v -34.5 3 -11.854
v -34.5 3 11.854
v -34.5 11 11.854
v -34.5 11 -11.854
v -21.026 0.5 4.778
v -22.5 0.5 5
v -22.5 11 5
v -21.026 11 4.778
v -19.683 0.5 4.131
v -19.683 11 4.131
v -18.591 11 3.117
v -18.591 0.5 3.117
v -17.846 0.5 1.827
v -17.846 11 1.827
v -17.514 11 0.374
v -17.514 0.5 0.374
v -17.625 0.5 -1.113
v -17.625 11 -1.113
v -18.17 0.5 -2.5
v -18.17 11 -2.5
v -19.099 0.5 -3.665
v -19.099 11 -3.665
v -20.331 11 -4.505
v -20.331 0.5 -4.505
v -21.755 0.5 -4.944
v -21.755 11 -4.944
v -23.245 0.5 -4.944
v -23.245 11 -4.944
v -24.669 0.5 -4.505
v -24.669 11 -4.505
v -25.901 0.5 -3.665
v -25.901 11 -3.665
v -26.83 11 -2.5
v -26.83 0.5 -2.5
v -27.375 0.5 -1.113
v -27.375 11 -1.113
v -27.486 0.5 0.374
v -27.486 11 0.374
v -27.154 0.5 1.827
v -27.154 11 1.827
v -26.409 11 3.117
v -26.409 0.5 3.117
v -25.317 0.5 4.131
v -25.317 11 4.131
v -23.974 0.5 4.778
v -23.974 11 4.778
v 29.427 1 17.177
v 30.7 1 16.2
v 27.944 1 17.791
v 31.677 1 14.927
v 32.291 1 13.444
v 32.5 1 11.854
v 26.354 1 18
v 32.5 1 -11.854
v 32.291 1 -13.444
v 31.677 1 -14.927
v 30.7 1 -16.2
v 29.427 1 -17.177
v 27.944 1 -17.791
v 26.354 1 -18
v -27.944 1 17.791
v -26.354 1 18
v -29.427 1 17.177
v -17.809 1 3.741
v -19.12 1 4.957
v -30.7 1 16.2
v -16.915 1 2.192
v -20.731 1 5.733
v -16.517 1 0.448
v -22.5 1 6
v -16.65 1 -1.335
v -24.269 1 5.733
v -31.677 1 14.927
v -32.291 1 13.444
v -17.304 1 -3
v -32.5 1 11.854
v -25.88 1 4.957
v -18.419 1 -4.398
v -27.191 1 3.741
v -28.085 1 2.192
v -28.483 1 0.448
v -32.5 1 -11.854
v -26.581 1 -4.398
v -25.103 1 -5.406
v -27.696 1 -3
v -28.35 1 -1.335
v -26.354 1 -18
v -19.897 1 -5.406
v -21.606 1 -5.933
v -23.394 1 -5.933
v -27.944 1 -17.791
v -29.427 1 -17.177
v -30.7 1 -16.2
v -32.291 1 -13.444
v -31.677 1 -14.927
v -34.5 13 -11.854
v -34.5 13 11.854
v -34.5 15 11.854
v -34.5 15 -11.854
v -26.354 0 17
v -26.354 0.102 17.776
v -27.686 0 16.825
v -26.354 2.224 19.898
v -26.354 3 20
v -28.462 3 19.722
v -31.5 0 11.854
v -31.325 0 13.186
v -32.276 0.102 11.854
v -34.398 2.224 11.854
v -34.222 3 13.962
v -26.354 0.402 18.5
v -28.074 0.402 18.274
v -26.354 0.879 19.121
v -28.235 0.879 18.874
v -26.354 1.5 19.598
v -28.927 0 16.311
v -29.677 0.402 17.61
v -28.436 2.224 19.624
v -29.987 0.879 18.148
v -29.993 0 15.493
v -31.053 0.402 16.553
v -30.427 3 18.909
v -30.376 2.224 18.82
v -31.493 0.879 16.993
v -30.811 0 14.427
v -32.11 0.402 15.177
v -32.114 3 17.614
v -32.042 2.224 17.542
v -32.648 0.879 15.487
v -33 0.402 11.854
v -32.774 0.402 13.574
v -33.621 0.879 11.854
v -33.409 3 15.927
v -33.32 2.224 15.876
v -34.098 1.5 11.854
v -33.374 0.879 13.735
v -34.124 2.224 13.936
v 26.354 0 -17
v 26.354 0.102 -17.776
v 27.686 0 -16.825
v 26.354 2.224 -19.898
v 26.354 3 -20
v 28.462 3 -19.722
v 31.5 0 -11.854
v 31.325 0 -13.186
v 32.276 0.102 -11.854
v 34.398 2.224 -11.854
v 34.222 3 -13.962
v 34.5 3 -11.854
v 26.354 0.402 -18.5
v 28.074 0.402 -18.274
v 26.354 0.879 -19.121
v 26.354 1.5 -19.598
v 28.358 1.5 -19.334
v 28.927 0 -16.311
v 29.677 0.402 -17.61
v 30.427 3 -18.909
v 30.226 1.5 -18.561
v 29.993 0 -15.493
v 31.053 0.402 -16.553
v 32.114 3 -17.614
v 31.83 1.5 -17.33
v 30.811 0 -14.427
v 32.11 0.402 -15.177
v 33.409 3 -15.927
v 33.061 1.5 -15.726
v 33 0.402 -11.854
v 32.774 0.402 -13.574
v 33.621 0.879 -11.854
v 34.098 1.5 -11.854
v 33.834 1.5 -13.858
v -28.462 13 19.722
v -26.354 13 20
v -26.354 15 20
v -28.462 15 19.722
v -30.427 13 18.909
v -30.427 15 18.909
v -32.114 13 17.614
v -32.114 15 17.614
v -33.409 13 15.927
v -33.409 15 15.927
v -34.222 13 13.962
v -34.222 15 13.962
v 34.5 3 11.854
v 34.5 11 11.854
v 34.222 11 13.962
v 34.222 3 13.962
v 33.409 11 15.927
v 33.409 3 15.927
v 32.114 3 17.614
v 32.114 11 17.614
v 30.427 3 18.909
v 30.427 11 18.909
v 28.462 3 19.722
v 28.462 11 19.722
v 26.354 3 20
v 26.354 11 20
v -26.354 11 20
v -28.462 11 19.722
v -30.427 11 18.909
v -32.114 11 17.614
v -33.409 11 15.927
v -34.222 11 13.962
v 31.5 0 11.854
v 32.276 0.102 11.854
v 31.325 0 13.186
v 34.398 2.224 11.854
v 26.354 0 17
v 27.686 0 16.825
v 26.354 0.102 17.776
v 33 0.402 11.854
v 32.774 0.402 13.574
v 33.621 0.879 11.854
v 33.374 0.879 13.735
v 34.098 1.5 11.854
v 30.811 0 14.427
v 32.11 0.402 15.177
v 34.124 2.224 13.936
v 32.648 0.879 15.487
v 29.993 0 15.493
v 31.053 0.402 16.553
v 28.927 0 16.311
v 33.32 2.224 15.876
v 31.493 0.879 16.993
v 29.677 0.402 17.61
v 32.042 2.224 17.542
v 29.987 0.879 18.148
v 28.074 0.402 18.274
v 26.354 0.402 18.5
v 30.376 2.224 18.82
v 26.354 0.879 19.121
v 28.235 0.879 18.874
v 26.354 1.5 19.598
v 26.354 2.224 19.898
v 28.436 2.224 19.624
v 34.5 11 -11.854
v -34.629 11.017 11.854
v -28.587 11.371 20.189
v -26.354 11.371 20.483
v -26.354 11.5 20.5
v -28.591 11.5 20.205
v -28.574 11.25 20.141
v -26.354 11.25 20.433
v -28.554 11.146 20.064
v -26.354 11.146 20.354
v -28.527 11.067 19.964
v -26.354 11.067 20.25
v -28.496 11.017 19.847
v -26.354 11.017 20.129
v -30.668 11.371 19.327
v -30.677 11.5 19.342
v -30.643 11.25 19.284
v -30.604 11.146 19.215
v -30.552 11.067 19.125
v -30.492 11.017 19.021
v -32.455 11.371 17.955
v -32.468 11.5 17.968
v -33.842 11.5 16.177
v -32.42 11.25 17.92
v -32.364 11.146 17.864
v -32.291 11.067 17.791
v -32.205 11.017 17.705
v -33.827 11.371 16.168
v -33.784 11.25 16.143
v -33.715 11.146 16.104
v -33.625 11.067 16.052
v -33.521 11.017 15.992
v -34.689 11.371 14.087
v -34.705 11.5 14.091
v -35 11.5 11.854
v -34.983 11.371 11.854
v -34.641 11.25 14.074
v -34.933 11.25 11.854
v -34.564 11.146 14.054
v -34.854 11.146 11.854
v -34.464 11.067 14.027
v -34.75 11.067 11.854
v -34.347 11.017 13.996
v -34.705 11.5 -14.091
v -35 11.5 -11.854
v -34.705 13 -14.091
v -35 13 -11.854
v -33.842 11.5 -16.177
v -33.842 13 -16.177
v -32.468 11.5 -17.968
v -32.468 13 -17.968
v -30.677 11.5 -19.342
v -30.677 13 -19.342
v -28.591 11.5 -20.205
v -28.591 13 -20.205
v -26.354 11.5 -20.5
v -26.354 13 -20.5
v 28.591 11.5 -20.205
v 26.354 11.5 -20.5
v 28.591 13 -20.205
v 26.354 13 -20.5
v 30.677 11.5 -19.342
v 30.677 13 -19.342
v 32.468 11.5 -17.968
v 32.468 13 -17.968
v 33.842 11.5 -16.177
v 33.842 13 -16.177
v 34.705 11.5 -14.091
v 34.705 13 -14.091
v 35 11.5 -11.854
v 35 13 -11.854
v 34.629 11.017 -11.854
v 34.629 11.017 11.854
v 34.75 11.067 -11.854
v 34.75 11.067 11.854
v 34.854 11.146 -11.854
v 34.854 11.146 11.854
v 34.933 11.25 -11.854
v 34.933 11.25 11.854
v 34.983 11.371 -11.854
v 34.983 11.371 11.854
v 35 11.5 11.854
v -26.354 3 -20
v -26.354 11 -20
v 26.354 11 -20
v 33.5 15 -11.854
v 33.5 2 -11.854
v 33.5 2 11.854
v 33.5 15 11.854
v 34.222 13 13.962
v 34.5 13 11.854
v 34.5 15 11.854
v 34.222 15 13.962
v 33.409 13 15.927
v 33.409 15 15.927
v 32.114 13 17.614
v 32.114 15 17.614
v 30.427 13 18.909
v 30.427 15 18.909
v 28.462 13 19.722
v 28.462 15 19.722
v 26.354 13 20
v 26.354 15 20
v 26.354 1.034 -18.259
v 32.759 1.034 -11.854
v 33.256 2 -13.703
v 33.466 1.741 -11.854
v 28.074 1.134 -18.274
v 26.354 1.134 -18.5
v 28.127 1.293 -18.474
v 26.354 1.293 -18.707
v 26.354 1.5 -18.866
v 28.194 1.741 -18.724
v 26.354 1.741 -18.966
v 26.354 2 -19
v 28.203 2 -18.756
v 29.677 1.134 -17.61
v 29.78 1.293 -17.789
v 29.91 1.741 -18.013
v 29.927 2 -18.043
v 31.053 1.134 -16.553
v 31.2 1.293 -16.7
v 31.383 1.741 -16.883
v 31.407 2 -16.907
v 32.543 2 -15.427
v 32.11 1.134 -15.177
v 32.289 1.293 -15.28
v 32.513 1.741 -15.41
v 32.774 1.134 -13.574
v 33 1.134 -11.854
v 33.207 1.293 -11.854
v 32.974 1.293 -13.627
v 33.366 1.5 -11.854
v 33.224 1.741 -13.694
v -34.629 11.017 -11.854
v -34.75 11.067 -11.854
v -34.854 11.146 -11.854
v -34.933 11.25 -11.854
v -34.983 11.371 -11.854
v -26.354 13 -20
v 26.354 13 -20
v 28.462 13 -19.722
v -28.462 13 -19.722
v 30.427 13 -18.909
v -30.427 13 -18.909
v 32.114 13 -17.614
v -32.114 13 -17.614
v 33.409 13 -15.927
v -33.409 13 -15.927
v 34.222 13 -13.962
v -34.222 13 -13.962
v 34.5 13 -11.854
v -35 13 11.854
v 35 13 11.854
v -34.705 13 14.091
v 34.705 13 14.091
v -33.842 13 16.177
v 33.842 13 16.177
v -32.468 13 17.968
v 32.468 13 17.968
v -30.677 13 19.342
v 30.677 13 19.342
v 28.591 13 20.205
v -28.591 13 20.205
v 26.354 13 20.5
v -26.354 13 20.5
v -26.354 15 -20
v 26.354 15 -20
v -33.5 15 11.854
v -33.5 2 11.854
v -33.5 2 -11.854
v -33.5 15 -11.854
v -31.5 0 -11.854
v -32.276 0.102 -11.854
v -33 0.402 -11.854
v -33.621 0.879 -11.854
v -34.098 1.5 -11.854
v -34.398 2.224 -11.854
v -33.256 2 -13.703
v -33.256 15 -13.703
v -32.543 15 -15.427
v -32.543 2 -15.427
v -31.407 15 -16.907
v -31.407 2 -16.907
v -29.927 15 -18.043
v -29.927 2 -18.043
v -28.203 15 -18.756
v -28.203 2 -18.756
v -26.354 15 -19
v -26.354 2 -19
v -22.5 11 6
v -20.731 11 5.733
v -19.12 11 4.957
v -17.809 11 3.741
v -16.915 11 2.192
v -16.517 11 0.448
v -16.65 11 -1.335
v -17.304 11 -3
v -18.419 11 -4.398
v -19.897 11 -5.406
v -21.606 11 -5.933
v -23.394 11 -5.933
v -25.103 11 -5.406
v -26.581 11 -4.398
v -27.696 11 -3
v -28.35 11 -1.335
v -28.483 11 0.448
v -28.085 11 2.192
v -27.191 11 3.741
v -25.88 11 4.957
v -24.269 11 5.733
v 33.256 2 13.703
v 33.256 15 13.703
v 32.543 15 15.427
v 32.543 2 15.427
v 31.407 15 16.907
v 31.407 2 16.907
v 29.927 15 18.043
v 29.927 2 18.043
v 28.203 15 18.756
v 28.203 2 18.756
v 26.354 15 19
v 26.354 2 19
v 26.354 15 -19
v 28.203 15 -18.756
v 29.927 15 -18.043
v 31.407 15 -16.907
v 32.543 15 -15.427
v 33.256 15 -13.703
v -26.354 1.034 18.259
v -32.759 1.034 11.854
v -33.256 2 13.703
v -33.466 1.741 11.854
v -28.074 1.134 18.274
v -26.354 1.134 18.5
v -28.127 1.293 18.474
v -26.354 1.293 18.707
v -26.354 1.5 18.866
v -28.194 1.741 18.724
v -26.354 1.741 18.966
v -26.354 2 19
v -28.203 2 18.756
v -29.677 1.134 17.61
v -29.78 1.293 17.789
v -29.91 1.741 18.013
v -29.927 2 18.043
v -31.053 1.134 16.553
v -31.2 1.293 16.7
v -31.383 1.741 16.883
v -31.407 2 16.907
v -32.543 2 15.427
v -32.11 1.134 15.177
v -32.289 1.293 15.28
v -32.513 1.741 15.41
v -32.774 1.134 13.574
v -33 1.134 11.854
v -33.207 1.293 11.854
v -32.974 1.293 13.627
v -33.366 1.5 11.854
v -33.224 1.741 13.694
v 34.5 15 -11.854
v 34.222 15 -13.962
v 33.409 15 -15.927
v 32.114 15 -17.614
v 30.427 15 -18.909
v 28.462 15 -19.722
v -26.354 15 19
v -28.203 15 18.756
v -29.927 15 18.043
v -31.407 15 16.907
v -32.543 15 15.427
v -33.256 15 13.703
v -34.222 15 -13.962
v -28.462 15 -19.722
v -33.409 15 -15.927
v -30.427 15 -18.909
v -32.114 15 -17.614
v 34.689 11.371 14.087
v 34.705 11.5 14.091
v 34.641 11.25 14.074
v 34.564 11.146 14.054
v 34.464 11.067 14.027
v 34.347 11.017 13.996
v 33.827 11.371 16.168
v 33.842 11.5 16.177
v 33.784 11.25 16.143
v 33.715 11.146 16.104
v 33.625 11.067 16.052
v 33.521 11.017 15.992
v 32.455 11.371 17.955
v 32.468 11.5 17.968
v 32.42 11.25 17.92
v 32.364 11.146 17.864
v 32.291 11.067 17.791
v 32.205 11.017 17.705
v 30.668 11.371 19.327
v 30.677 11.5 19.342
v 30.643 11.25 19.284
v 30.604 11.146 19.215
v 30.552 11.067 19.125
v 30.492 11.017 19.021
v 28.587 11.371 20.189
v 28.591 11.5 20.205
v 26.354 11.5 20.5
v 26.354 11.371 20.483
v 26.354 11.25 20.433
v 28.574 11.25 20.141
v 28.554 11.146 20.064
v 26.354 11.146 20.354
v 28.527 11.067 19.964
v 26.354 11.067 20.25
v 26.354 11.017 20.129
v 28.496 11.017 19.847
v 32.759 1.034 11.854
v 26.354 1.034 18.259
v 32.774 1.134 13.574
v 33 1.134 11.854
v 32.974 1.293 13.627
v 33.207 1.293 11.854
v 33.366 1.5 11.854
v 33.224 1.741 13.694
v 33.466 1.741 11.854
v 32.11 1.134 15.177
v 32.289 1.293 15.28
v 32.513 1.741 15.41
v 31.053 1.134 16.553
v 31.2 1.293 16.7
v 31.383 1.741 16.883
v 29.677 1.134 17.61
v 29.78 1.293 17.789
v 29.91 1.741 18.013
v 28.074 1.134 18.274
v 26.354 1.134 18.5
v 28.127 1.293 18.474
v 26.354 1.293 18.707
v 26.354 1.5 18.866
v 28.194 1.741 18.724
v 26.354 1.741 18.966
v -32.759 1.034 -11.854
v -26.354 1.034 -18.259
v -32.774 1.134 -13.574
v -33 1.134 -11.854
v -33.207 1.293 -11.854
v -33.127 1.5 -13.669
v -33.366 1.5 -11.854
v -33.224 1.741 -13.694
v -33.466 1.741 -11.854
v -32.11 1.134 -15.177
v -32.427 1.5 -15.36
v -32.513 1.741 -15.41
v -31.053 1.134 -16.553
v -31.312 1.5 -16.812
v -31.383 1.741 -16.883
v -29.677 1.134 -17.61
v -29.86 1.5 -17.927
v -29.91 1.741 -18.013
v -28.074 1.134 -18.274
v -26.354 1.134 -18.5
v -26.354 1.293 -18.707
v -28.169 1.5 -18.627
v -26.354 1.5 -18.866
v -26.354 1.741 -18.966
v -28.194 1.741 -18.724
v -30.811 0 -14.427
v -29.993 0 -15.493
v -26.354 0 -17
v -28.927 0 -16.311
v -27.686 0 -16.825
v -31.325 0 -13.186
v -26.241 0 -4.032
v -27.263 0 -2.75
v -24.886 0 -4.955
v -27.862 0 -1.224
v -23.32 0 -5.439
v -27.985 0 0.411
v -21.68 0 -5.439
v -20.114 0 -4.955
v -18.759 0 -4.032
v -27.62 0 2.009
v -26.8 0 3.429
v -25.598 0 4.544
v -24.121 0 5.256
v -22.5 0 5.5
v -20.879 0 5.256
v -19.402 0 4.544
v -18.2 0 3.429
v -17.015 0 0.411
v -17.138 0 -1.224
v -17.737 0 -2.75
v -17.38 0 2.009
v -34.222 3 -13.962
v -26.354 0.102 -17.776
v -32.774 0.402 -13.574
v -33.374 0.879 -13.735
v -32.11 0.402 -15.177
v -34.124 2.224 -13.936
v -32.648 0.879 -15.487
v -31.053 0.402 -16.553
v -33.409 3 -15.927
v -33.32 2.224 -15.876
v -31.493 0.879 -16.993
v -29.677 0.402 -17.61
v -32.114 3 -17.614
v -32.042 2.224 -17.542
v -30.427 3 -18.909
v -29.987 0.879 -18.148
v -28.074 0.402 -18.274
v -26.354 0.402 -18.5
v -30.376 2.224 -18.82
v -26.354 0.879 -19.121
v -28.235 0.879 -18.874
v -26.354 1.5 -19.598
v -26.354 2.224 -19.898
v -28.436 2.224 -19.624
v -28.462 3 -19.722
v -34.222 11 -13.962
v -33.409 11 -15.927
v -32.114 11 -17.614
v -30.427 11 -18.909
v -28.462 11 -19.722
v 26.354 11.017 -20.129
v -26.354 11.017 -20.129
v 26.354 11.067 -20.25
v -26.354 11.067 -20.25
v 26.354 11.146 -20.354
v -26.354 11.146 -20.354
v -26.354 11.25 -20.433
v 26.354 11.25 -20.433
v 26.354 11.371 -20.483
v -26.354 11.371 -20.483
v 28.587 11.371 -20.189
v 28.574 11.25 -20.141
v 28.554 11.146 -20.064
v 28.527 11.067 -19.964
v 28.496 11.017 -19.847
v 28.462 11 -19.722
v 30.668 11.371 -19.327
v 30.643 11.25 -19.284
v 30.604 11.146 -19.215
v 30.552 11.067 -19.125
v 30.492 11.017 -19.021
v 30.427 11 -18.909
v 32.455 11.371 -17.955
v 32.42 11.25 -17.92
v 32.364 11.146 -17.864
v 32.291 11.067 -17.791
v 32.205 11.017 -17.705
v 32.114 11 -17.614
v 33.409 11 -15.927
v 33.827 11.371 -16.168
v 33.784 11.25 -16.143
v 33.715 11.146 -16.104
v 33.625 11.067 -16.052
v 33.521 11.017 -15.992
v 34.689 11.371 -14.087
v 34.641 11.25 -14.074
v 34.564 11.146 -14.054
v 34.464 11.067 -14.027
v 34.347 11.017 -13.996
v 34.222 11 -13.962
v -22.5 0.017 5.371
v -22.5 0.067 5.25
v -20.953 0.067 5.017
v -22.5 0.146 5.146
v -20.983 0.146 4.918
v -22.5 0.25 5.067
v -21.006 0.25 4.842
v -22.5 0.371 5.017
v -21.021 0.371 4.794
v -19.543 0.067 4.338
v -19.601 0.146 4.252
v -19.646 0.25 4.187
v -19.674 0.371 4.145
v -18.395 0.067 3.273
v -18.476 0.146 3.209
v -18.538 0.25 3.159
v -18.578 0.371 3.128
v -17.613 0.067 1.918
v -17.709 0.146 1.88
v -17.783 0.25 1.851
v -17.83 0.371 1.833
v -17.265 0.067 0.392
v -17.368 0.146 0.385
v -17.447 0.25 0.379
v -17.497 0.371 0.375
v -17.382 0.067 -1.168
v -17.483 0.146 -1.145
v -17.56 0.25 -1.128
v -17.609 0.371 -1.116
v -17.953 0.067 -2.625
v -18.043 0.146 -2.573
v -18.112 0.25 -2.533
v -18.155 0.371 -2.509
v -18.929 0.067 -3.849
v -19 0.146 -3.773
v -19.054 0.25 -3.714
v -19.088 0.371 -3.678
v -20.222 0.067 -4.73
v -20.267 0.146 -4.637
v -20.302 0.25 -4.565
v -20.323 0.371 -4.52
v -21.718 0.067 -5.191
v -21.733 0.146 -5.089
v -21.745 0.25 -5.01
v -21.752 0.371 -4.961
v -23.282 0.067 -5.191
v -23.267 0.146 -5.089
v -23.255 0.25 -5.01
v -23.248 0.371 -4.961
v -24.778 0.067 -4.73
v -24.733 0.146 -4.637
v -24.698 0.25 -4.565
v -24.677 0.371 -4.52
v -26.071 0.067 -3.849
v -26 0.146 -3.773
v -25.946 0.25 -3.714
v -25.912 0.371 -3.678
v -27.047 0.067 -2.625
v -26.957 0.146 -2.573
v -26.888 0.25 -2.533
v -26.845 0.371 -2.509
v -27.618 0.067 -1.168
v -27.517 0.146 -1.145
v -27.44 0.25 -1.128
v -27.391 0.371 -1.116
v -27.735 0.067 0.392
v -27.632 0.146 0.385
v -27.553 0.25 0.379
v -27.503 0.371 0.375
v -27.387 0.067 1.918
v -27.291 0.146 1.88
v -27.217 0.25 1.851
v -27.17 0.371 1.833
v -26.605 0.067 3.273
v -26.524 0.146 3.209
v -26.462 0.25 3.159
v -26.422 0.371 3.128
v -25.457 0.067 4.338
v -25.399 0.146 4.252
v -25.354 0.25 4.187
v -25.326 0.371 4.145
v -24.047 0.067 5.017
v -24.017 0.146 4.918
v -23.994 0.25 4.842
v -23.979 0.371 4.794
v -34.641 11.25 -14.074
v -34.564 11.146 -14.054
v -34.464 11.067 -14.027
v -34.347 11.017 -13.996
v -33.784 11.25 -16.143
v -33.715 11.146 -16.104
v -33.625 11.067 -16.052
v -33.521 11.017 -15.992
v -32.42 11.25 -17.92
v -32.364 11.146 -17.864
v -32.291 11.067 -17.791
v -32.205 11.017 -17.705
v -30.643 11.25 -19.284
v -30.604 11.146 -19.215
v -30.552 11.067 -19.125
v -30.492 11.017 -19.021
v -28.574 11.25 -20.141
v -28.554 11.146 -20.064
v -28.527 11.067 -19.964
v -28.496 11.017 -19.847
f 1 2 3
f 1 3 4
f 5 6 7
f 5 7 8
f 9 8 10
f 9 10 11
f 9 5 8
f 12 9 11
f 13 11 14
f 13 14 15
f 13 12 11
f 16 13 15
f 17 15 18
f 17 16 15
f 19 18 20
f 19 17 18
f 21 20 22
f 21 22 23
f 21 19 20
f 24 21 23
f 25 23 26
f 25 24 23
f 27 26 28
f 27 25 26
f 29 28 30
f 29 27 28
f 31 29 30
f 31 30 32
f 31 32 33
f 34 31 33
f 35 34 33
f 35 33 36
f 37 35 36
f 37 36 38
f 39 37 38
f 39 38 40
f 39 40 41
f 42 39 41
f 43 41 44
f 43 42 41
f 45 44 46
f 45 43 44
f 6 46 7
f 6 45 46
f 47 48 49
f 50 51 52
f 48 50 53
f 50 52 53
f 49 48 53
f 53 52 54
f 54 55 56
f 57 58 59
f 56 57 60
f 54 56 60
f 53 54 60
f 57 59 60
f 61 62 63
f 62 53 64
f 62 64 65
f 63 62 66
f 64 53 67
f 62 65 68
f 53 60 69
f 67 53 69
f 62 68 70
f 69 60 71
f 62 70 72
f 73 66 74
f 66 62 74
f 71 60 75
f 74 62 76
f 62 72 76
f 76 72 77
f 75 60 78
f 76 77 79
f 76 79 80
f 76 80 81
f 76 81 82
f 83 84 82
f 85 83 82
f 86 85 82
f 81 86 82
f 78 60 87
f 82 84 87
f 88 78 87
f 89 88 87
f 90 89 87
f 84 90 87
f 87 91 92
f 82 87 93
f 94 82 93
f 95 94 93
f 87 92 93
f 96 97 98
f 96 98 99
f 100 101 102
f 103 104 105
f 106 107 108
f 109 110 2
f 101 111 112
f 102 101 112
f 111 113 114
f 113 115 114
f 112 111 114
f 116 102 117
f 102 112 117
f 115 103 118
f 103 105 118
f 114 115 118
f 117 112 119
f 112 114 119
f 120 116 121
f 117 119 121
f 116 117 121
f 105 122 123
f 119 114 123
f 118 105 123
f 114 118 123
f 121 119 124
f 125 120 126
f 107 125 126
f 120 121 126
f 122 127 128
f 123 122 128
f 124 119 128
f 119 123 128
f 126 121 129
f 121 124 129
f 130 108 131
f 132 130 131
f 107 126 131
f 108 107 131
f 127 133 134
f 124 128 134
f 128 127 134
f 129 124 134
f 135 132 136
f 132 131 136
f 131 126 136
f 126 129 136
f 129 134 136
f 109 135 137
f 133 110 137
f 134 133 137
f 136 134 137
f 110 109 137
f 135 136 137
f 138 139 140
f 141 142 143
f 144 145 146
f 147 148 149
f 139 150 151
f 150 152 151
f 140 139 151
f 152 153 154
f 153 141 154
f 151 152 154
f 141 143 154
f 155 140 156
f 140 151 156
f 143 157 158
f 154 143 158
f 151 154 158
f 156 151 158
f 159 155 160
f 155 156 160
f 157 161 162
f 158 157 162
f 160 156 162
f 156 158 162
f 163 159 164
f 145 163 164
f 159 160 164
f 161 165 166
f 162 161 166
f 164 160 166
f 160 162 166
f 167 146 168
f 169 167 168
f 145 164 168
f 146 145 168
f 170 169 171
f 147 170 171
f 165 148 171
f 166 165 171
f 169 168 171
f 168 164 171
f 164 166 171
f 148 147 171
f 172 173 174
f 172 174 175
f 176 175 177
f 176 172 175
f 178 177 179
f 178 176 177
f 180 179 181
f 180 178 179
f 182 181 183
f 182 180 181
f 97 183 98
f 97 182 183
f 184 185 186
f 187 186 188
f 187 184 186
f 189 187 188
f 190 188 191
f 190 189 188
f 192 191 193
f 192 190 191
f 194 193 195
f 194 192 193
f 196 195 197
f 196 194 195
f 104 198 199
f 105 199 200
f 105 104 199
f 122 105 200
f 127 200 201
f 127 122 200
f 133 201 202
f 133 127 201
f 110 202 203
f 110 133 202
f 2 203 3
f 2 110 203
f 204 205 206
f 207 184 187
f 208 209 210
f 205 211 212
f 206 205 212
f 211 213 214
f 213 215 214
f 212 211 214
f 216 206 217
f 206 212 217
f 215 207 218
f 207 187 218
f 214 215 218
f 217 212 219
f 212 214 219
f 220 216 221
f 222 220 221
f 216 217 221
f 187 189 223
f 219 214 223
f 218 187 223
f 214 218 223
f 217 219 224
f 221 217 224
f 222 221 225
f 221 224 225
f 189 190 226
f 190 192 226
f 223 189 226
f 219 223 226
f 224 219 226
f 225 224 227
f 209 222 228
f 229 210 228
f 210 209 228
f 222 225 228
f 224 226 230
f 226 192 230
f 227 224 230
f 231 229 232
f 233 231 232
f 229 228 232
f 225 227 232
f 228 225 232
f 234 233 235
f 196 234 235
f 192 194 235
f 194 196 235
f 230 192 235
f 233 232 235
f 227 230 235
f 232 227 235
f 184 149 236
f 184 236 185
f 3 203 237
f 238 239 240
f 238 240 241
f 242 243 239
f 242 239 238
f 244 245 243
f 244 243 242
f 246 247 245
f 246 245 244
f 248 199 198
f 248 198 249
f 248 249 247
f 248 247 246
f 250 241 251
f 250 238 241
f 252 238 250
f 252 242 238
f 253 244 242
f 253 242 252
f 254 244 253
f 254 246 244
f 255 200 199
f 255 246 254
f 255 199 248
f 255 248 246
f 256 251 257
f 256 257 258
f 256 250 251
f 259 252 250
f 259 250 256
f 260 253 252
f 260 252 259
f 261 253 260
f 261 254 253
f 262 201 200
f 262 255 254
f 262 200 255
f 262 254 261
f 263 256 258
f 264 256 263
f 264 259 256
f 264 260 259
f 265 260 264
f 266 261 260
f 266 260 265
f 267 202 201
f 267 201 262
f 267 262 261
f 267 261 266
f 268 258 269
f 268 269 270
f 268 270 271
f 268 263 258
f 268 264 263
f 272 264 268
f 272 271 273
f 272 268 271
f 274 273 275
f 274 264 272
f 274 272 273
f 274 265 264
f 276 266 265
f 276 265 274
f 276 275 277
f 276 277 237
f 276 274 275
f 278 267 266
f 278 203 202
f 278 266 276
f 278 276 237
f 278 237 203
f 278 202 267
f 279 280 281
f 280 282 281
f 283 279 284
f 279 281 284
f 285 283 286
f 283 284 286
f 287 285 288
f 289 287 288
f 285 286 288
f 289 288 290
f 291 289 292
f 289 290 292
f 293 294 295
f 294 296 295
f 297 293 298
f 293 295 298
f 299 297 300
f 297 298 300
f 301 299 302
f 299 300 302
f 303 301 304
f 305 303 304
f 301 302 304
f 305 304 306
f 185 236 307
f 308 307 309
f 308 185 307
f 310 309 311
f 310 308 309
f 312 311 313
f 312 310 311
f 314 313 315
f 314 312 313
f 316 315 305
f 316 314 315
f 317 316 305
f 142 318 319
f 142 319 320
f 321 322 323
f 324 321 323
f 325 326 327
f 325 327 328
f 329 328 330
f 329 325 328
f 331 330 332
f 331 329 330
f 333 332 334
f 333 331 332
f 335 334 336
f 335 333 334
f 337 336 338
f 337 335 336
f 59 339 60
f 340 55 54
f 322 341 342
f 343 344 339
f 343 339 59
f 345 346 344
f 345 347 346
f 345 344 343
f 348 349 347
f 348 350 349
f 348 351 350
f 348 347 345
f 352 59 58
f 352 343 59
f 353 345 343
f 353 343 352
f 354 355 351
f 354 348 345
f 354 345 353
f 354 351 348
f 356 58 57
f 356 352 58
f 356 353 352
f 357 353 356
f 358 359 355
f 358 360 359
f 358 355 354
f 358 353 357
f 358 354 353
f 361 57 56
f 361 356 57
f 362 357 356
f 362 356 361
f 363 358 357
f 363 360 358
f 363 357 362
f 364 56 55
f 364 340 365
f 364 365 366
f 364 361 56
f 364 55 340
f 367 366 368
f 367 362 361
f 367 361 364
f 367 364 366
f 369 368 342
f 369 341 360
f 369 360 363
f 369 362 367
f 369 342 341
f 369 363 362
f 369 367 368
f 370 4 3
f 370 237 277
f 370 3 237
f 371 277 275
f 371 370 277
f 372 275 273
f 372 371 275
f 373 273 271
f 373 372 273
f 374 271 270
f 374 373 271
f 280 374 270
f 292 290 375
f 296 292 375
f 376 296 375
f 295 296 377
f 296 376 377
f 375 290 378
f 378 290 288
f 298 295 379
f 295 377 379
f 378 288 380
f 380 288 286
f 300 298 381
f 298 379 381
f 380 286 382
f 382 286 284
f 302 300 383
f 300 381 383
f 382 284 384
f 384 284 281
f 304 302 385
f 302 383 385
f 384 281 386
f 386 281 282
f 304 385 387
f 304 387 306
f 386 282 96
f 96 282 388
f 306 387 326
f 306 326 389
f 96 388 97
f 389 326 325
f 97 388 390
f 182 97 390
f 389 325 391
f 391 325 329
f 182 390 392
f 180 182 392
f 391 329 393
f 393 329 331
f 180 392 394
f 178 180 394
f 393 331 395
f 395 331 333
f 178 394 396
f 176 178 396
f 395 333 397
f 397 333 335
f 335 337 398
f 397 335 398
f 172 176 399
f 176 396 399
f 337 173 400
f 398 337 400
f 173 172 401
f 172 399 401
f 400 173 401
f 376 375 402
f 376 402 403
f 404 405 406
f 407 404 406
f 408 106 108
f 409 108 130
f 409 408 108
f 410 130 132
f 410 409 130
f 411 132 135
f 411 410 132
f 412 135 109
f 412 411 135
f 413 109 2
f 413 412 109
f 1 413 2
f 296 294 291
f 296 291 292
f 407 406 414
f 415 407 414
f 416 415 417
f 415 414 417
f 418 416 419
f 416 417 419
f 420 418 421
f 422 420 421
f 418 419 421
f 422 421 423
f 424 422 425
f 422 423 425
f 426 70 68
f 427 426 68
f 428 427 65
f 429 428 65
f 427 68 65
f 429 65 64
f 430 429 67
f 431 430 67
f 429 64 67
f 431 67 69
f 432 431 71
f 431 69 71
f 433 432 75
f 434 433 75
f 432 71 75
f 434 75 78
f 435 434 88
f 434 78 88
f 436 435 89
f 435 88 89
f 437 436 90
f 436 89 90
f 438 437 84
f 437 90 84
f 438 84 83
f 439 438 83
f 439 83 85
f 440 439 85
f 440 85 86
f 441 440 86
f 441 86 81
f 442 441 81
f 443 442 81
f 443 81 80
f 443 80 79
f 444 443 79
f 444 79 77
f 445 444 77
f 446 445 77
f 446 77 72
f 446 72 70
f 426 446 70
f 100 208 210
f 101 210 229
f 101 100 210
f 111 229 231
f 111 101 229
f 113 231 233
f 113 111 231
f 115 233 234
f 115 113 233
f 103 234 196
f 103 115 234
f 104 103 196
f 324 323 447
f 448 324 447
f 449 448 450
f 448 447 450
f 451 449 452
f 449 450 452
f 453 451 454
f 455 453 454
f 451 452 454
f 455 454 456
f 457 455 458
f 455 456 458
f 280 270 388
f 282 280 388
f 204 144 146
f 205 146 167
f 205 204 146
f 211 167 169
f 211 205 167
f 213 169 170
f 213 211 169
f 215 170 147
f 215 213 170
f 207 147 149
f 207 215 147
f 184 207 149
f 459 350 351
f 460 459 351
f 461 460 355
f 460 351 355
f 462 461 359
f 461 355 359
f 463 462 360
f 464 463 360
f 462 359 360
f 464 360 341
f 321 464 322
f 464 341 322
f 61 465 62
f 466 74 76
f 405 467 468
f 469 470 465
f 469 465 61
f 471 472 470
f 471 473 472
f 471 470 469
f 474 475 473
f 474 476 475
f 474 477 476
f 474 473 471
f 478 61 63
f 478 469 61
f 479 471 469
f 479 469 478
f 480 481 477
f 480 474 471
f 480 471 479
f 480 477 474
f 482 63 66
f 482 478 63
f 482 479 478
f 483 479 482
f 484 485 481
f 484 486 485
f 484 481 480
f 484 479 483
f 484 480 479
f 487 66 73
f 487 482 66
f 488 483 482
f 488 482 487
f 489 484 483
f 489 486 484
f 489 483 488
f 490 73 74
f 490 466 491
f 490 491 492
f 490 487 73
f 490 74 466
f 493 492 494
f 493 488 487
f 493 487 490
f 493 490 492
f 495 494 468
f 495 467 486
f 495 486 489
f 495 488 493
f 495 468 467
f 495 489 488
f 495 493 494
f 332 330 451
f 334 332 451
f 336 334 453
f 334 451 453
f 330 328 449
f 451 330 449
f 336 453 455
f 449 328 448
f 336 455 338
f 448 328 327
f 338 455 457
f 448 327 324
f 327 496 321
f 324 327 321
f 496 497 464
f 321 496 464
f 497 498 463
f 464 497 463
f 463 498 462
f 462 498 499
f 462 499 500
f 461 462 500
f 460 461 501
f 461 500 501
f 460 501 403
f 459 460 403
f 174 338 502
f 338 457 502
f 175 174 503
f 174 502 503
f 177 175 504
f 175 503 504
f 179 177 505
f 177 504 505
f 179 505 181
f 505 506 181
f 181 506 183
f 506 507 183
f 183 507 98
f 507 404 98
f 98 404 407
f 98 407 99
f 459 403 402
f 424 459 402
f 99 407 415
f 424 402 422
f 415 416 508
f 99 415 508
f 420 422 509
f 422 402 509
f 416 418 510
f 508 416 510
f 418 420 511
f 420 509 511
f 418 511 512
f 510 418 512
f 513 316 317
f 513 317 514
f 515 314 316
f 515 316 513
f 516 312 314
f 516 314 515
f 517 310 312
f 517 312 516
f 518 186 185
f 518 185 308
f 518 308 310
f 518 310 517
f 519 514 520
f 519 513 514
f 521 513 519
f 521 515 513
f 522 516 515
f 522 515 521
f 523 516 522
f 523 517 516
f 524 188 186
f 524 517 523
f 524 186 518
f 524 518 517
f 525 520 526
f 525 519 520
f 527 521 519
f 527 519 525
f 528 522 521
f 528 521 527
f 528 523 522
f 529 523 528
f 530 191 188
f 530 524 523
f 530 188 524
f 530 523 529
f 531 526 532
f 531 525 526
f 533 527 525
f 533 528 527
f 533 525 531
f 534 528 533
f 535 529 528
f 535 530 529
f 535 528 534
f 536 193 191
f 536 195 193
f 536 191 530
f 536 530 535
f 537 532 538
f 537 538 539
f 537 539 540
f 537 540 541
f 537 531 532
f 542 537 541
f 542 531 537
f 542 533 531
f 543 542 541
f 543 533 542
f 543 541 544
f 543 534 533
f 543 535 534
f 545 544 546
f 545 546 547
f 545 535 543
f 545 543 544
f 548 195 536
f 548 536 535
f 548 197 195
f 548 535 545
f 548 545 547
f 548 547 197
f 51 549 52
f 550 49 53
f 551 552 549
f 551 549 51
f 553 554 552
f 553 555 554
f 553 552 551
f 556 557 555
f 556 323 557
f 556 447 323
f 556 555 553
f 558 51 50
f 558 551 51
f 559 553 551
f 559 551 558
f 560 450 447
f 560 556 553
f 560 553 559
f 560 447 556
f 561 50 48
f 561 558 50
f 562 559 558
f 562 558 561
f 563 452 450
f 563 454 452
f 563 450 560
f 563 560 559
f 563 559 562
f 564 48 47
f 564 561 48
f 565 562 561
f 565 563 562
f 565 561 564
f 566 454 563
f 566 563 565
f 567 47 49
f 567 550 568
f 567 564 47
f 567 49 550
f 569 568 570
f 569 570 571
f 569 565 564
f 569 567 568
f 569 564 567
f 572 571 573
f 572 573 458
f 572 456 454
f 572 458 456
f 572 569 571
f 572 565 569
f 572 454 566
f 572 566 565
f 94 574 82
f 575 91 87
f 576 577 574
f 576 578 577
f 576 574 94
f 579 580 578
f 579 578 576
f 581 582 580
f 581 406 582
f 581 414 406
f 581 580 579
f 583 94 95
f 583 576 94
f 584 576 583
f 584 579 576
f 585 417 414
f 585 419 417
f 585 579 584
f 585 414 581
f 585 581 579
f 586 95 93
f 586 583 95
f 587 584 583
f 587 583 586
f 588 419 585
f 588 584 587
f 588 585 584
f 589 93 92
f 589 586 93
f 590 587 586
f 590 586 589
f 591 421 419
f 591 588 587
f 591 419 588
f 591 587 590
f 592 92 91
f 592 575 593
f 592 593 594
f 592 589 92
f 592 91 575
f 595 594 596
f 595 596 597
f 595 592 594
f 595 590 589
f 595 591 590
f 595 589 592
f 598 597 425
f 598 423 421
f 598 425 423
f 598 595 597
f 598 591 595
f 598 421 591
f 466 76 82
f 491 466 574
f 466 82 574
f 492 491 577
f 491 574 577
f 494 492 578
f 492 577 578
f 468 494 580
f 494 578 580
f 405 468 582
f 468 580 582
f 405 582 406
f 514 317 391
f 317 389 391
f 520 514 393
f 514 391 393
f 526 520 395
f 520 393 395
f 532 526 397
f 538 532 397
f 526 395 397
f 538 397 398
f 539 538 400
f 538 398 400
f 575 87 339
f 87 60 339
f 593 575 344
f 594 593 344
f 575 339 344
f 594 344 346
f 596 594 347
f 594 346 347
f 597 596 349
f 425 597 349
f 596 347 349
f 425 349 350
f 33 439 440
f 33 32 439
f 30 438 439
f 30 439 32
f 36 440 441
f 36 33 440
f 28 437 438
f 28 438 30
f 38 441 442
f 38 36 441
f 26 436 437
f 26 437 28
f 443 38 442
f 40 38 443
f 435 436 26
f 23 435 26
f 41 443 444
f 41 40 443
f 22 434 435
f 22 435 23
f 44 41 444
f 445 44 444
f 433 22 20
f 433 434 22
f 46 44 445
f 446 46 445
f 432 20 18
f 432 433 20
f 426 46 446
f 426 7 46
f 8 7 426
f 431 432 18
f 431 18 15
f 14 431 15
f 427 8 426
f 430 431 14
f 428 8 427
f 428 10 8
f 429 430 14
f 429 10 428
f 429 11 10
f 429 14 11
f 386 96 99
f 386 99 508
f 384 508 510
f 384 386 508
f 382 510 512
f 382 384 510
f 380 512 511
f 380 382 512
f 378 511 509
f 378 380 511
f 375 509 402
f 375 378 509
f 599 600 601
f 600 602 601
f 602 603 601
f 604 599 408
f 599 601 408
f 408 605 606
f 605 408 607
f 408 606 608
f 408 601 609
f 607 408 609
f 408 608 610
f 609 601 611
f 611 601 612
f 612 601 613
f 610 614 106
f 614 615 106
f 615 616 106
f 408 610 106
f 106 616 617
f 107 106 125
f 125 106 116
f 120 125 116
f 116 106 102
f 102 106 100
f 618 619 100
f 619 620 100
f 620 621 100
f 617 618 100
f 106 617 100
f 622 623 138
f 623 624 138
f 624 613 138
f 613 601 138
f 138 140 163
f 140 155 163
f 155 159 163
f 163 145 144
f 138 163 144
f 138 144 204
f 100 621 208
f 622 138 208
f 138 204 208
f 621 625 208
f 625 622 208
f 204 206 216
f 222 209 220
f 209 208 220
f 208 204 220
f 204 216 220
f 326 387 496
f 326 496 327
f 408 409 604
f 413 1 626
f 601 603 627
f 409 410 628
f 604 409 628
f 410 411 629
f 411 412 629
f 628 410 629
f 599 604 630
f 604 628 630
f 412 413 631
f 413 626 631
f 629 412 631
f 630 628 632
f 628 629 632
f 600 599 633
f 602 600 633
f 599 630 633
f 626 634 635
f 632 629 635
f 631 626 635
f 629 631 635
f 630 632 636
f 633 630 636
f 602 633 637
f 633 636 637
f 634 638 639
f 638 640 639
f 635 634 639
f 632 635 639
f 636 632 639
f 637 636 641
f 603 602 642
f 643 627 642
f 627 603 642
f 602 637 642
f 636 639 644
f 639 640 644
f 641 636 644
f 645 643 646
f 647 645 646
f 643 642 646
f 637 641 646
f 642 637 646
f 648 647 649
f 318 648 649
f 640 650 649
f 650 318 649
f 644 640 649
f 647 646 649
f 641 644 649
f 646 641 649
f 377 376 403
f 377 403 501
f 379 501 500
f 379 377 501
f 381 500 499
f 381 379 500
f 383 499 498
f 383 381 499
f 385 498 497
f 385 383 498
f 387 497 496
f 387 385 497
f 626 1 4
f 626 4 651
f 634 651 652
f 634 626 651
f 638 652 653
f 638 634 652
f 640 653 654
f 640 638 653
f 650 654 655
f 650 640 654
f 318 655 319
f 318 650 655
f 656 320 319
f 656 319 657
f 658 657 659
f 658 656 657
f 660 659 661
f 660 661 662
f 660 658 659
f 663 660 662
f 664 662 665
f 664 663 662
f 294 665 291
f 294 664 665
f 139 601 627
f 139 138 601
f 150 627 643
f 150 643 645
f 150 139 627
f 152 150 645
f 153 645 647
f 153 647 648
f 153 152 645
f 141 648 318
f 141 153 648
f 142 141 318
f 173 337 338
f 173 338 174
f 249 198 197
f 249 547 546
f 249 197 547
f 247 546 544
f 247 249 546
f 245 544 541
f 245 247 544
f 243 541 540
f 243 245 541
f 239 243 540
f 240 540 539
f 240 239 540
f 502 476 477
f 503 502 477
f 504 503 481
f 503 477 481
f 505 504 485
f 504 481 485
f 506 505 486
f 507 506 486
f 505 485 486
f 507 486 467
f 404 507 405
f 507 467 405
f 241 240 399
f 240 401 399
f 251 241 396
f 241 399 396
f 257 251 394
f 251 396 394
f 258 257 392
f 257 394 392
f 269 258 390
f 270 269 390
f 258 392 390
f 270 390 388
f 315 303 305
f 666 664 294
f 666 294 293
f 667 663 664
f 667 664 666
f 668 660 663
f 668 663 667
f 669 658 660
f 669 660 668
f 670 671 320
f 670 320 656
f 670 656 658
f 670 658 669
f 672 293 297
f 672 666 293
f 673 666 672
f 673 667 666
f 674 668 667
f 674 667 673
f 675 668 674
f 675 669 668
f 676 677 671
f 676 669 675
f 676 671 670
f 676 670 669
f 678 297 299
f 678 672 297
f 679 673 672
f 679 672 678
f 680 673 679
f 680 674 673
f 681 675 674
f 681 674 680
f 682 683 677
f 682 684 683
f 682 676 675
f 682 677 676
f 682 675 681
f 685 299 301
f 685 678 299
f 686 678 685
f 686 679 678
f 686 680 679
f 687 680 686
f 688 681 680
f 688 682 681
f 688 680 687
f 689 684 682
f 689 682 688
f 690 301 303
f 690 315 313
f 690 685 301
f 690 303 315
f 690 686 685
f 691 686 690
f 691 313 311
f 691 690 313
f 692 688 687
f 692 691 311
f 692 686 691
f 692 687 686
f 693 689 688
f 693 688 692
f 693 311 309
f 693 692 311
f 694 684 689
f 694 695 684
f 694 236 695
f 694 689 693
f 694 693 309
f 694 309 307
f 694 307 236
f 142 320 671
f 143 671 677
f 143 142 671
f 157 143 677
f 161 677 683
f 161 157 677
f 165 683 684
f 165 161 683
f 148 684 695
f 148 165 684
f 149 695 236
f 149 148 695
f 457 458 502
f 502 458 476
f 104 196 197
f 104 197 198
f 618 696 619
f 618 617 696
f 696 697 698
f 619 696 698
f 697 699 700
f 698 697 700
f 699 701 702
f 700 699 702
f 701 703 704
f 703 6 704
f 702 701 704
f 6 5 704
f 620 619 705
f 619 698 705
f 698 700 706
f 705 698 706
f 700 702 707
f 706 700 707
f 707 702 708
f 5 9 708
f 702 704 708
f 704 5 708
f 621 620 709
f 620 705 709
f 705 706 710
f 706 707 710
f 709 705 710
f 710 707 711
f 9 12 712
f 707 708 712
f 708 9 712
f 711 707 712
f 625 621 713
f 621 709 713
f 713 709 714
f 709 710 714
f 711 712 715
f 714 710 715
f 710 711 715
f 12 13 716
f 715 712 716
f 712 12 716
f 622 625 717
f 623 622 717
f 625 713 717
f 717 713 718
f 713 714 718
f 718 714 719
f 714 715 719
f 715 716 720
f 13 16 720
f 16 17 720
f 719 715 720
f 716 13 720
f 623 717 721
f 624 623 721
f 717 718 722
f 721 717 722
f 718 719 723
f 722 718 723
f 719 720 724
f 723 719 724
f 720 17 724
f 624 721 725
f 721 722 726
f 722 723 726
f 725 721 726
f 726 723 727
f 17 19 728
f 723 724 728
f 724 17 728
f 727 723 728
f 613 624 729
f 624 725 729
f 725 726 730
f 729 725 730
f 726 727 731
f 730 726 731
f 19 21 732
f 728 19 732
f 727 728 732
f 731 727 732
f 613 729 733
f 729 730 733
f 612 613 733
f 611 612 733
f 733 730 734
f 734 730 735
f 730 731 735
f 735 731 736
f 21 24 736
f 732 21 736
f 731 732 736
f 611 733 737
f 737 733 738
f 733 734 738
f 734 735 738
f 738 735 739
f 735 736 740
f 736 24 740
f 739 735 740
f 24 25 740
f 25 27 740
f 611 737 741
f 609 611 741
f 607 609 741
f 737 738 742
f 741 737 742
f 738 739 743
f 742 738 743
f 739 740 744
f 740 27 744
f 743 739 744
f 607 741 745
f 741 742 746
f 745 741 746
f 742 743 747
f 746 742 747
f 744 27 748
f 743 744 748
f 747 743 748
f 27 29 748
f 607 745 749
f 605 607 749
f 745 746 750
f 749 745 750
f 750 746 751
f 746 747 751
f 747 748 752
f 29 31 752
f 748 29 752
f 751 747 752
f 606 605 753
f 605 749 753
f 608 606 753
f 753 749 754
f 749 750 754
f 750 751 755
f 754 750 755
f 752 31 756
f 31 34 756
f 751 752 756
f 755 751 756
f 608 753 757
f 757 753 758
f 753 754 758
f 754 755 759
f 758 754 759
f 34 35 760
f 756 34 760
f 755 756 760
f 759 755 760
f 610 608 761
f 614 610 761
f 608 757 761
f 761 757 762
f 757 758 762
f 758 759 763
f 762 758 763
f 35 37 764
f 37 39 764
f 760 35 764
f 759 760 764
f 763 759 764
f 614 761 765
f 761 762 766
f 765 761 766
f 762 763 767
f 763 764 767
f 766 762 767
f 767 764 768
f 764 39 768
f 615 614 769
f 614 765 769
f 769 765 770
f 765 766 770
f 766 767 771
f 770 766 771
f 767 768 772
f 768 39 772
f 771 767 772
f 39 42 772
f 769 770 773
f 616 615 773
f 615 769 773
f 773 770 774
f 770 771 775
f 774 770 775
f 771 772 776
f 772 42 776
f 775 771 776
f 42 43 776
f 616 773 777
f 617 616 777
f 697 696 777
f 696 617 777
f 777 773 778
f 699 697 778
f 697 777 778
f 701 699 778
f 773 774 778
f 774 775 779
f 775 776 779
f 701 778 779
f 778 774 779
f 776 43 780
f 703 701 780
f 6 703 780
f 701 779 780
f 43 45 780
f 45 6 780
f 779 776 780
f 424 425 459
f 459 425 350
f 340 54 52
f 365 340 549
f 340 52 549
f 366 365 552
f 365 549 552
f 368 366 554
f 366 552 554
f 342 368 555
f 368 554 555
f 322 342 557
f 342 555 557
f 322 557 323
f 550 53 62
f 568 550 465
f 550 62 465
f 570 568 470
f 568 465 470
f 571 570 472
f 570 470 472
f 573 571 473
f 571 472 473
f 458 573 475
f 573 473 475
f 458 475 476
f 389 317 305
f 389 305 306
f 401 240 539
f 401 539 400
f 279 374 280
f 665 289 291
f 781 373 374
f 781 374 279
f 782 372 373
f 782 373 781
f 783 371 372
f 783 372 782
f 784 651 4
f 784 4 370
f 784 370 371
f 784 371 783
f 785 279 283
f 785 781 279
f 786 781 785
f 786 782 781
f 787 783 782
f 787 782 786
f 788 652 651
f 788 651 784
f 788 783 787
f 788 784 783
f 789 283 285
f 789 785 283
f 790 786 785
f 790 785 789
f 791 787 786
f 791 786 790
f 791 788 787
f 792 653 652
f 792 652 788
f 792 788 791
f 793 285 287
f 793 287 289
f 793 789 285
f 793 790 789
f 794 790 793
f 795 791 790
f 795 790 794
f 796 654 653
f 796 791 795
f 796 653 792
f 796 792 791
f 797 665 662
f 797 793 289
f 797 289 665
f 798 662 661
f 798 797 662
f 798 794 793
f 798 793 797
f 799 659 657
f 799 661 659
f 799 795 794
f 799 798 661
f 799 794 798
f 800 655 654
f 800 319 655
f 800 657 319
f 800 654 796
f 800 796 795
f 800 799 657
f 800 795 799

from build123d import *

# Parameters (mm, degrees)
DODANIE_WYCI_GNI_CIE1_DEPTH = 15
SZKIC1_3_R                  = 6
DODANIE_WYCI_GNI_CIE2_DEPTH = 1
SZKIC1_4_R                  = 6
SZKIC1_4_R_2                = 5
DODANIE_WYCI_GNI_CIE3_DEPTH = 11
ZAOKR_GLENIE1_R             = 3
ZAOKR_GLENIE2_R             = 0.5
ZAOKR_GLENIE3_R             = 1


with BuildPart() as part:
    # Szkic1 → Dodanie-wyciągnięcie1 (new body)
    with BuildSketch(Plane(origin=(0, 0, 0), x_dir=(1, 0, 0), z_dir=(0, 1, 0))):
        with BuildLine():
            Line((-26.353622573, 20), (26.353622573, 20))
            ThreePointArc((26.353622573, 20), (32.113981294, 17.613981294), (34.5, 11.853622573))
            Line((34.5, 11.853622573), (34.5, -11.853622573))
            ThreePointArc((34.5, -11.853622573), (32.113981294, -17.613981294), (26.353622573, -20))
            Line((26.353622573, -20), (-26.353622573, -20))
            ThreePointArc((-26.353622573, -20), (-32.113981294, -17.613981294), (-34.5, -11.853622573))
            Line((-34.5, -11.853622573), (-34.5, 11.853622573))
            ThreePointArc((-34.5, 11.853622573), (-32.113981294, 17.613981294), (-26.353622573, 20))
        make_face()
        with BuildLine():
            Line((-26.353622573, 19), (26.353622573, 19))
            ThreePointArc((26.353622573, 19), (31.406874513, 16.906874513), (33.5, 11.853622573))
            Line((33.5, 11.853622573), (33.5, -11.853622573))
            ThreePointArc((33.5, -11.853622573), (31.406874513, -16.906874513), (26.353622573, -19))
            Line((26.353622573, -19), (-26.353622573, -19))
            ThreePointArc((-26.353622573, -19), (-31.406874513, -16.906874513), (-33.5, -11.853622573))
            Line((-33.5, -11.853622573), (-33.5, 11.853622573))
            ThreePointArc((-33.5, 11.853622573), (-31.406874513, 16.906874513), (-26.353622573, 19))
        make_face(mode=Mode.SUBTRACT)
    extrude(amount=DODANIE_WYCI_GNI_CIE1_DEPTH)

    # Szkic1<3> → Dodanie-wyciągnięcie2 (add)
    with BuildSketch(Plane(origin=(0, 0, 0), x_dir=(1, 0, 0), z_dir=(0, 1, 0))):
        with BuildLine():
            Line((26.353622573, 19), (-26.353622573, 19))
            ThreePointArc((-26.353622573, 19), (-31.406874513, 16.906874513), (-33.5, 11.853622573))
            Line((-33.5, 11.853622573), (-33.5, -11.853622573))
            ThreePointArc((-33.5, -11.853622573), (-31.406874513, -16.906874513), (-26.353622573, -19))
            Line((-26.353622573, -19), (26.353622573, -19))
            ThreePointArc((26.353622573, -19), (31.406874513, -16.906874513), (33.5, -11.853622573))
            Line((33.5, -11.853622573), (33.5, 11.853622573))
            ThreePointArc((33.5, 11.853622573), (31.406874513, 16.906874513), (26.353622573, 19))
        make_face()
        with Locations((-22.5, 0)):
            Circle(SZKIC1_3_R, mode=Mode.SUBTRACT)
    extrude(amount=DODANIE_WYCI_GNI_CIE2_DEPTH)

    # Szkic1<4> → Dodanie-wyciągnięcie3 (add)
    with BuildSketch(Plane(origin=(0, 0, 0), x_dir=(1, 0, 0), z_dir=(0, 1, 0))):
        with Locations((-22.5, 0)):
            Circle(SZKIC1_4_R)
        with Locations((-22.5, 0)):
            Circle(SZKIC1_4_R_2, mode=Mode.SUBTRACT)
    extrude(amount=DODANIE_WYCI_GNI_CIE3_DEPTH)

    # Zaokrąglenie1
    zaokr_glenie1_edges = [part.edges().sort_by_distance(p)[0] for p in [
        (-34.5, 0, 0),
        (-32.113981294, 0, -17.613981294),
        (0, 0, -20),
        (32.113981294, 0, -17.613981294),
        (34.5, 0, 0),
        (32.113981294, 0, 17.613981294),
        (-32.113981294, 0, 17.613981294),
        (0, 0, 20),
    ]]
    fillet(zaokr_glenie1_edges, radius=ZAOKR_GLENIE1_R)

    # Wyciągnięcie po ścieżce1: sweep along a path in Szkic2
    with BuildLine(Plane(origin=(0, 13, 0), x_dir=(1, 0, 0), z_dir=(0, 1, 0))) as wyci_gni_cie_po_cie_ce1_path:
        Line((-26.353622573, 20), (26.353622573, 20))
        ThreePointArc((26.353622573, 20), (32.113981294, 17.613981294), (34.5, 11.853622573))
        Line((34.5, 11.853622573), (34.5, -11.853622573))
        ThreePointArc((34.5, -11.853622573), (32.113981294, -17.613981294), (26.353622573, -20))
        Line((26.353622573, -20), (-26.353622573, -20))
        ThreePointArc((-26.353622573, -20), (-32.113981294, -17.613981294), (-34.5, -11.853622573))
        Line((-34.5, -11.853622573), (-34.5, 11.853622573))
        ThreePointArc((-34.5, 11.853622573), (-32.113981294, 17.613981294), (-26.353622573, 20))
    # Szkic3 → Wyciągnięcie po ścieżce1 (sweep)
    with BuildSketch(Plane(origin=(0, 0, 0), x_dir=(0, 0, -1), z_dir=(1, 0, 0))):
        with BuildLine():
            Line((20, 13), (20.5, 13))
            Line((20.5, 13), (20.5, 11.5))
            ThreePointArc((20.5, 11.5), (20.353553391, 11.146446609), (20, 11))
            Line((20, 11), (20, 13))
        make_face()
    sweep(path=wyci_gni_cie_po_cie_ce1_path.line)

    # Zaokrąglenie2
    zaokr_glenie2_edges = [part.edges().sort_by_distance(p)[0] for p in [
        (-27.5, 0, 0),
    ]]
    fillet(zaokr_glenie2_edges, radius=ZAOKR_GLENIE2_R)

    # Zaokrąglenie3
    zaokr_glenie3_edges = [part.edges().sort_by_distance(p)[0] for p in [
        (-31.406874513, 1, 16.906874513),
        (-33.5, 1, 0),
        (-31.406874513, 1, -16.906874513),
        (0, 1, -19),
        (31.406874513, 1, -16.906874513),
        (33.5, 1, 0),
        (31.406874513, 1, 16.906874513),
        (0, 1, 19),
    ]]
    fillet(zaokr_glenie3_edges, radius=ZAOKR_GLENIE3_R)


solid = part.part
